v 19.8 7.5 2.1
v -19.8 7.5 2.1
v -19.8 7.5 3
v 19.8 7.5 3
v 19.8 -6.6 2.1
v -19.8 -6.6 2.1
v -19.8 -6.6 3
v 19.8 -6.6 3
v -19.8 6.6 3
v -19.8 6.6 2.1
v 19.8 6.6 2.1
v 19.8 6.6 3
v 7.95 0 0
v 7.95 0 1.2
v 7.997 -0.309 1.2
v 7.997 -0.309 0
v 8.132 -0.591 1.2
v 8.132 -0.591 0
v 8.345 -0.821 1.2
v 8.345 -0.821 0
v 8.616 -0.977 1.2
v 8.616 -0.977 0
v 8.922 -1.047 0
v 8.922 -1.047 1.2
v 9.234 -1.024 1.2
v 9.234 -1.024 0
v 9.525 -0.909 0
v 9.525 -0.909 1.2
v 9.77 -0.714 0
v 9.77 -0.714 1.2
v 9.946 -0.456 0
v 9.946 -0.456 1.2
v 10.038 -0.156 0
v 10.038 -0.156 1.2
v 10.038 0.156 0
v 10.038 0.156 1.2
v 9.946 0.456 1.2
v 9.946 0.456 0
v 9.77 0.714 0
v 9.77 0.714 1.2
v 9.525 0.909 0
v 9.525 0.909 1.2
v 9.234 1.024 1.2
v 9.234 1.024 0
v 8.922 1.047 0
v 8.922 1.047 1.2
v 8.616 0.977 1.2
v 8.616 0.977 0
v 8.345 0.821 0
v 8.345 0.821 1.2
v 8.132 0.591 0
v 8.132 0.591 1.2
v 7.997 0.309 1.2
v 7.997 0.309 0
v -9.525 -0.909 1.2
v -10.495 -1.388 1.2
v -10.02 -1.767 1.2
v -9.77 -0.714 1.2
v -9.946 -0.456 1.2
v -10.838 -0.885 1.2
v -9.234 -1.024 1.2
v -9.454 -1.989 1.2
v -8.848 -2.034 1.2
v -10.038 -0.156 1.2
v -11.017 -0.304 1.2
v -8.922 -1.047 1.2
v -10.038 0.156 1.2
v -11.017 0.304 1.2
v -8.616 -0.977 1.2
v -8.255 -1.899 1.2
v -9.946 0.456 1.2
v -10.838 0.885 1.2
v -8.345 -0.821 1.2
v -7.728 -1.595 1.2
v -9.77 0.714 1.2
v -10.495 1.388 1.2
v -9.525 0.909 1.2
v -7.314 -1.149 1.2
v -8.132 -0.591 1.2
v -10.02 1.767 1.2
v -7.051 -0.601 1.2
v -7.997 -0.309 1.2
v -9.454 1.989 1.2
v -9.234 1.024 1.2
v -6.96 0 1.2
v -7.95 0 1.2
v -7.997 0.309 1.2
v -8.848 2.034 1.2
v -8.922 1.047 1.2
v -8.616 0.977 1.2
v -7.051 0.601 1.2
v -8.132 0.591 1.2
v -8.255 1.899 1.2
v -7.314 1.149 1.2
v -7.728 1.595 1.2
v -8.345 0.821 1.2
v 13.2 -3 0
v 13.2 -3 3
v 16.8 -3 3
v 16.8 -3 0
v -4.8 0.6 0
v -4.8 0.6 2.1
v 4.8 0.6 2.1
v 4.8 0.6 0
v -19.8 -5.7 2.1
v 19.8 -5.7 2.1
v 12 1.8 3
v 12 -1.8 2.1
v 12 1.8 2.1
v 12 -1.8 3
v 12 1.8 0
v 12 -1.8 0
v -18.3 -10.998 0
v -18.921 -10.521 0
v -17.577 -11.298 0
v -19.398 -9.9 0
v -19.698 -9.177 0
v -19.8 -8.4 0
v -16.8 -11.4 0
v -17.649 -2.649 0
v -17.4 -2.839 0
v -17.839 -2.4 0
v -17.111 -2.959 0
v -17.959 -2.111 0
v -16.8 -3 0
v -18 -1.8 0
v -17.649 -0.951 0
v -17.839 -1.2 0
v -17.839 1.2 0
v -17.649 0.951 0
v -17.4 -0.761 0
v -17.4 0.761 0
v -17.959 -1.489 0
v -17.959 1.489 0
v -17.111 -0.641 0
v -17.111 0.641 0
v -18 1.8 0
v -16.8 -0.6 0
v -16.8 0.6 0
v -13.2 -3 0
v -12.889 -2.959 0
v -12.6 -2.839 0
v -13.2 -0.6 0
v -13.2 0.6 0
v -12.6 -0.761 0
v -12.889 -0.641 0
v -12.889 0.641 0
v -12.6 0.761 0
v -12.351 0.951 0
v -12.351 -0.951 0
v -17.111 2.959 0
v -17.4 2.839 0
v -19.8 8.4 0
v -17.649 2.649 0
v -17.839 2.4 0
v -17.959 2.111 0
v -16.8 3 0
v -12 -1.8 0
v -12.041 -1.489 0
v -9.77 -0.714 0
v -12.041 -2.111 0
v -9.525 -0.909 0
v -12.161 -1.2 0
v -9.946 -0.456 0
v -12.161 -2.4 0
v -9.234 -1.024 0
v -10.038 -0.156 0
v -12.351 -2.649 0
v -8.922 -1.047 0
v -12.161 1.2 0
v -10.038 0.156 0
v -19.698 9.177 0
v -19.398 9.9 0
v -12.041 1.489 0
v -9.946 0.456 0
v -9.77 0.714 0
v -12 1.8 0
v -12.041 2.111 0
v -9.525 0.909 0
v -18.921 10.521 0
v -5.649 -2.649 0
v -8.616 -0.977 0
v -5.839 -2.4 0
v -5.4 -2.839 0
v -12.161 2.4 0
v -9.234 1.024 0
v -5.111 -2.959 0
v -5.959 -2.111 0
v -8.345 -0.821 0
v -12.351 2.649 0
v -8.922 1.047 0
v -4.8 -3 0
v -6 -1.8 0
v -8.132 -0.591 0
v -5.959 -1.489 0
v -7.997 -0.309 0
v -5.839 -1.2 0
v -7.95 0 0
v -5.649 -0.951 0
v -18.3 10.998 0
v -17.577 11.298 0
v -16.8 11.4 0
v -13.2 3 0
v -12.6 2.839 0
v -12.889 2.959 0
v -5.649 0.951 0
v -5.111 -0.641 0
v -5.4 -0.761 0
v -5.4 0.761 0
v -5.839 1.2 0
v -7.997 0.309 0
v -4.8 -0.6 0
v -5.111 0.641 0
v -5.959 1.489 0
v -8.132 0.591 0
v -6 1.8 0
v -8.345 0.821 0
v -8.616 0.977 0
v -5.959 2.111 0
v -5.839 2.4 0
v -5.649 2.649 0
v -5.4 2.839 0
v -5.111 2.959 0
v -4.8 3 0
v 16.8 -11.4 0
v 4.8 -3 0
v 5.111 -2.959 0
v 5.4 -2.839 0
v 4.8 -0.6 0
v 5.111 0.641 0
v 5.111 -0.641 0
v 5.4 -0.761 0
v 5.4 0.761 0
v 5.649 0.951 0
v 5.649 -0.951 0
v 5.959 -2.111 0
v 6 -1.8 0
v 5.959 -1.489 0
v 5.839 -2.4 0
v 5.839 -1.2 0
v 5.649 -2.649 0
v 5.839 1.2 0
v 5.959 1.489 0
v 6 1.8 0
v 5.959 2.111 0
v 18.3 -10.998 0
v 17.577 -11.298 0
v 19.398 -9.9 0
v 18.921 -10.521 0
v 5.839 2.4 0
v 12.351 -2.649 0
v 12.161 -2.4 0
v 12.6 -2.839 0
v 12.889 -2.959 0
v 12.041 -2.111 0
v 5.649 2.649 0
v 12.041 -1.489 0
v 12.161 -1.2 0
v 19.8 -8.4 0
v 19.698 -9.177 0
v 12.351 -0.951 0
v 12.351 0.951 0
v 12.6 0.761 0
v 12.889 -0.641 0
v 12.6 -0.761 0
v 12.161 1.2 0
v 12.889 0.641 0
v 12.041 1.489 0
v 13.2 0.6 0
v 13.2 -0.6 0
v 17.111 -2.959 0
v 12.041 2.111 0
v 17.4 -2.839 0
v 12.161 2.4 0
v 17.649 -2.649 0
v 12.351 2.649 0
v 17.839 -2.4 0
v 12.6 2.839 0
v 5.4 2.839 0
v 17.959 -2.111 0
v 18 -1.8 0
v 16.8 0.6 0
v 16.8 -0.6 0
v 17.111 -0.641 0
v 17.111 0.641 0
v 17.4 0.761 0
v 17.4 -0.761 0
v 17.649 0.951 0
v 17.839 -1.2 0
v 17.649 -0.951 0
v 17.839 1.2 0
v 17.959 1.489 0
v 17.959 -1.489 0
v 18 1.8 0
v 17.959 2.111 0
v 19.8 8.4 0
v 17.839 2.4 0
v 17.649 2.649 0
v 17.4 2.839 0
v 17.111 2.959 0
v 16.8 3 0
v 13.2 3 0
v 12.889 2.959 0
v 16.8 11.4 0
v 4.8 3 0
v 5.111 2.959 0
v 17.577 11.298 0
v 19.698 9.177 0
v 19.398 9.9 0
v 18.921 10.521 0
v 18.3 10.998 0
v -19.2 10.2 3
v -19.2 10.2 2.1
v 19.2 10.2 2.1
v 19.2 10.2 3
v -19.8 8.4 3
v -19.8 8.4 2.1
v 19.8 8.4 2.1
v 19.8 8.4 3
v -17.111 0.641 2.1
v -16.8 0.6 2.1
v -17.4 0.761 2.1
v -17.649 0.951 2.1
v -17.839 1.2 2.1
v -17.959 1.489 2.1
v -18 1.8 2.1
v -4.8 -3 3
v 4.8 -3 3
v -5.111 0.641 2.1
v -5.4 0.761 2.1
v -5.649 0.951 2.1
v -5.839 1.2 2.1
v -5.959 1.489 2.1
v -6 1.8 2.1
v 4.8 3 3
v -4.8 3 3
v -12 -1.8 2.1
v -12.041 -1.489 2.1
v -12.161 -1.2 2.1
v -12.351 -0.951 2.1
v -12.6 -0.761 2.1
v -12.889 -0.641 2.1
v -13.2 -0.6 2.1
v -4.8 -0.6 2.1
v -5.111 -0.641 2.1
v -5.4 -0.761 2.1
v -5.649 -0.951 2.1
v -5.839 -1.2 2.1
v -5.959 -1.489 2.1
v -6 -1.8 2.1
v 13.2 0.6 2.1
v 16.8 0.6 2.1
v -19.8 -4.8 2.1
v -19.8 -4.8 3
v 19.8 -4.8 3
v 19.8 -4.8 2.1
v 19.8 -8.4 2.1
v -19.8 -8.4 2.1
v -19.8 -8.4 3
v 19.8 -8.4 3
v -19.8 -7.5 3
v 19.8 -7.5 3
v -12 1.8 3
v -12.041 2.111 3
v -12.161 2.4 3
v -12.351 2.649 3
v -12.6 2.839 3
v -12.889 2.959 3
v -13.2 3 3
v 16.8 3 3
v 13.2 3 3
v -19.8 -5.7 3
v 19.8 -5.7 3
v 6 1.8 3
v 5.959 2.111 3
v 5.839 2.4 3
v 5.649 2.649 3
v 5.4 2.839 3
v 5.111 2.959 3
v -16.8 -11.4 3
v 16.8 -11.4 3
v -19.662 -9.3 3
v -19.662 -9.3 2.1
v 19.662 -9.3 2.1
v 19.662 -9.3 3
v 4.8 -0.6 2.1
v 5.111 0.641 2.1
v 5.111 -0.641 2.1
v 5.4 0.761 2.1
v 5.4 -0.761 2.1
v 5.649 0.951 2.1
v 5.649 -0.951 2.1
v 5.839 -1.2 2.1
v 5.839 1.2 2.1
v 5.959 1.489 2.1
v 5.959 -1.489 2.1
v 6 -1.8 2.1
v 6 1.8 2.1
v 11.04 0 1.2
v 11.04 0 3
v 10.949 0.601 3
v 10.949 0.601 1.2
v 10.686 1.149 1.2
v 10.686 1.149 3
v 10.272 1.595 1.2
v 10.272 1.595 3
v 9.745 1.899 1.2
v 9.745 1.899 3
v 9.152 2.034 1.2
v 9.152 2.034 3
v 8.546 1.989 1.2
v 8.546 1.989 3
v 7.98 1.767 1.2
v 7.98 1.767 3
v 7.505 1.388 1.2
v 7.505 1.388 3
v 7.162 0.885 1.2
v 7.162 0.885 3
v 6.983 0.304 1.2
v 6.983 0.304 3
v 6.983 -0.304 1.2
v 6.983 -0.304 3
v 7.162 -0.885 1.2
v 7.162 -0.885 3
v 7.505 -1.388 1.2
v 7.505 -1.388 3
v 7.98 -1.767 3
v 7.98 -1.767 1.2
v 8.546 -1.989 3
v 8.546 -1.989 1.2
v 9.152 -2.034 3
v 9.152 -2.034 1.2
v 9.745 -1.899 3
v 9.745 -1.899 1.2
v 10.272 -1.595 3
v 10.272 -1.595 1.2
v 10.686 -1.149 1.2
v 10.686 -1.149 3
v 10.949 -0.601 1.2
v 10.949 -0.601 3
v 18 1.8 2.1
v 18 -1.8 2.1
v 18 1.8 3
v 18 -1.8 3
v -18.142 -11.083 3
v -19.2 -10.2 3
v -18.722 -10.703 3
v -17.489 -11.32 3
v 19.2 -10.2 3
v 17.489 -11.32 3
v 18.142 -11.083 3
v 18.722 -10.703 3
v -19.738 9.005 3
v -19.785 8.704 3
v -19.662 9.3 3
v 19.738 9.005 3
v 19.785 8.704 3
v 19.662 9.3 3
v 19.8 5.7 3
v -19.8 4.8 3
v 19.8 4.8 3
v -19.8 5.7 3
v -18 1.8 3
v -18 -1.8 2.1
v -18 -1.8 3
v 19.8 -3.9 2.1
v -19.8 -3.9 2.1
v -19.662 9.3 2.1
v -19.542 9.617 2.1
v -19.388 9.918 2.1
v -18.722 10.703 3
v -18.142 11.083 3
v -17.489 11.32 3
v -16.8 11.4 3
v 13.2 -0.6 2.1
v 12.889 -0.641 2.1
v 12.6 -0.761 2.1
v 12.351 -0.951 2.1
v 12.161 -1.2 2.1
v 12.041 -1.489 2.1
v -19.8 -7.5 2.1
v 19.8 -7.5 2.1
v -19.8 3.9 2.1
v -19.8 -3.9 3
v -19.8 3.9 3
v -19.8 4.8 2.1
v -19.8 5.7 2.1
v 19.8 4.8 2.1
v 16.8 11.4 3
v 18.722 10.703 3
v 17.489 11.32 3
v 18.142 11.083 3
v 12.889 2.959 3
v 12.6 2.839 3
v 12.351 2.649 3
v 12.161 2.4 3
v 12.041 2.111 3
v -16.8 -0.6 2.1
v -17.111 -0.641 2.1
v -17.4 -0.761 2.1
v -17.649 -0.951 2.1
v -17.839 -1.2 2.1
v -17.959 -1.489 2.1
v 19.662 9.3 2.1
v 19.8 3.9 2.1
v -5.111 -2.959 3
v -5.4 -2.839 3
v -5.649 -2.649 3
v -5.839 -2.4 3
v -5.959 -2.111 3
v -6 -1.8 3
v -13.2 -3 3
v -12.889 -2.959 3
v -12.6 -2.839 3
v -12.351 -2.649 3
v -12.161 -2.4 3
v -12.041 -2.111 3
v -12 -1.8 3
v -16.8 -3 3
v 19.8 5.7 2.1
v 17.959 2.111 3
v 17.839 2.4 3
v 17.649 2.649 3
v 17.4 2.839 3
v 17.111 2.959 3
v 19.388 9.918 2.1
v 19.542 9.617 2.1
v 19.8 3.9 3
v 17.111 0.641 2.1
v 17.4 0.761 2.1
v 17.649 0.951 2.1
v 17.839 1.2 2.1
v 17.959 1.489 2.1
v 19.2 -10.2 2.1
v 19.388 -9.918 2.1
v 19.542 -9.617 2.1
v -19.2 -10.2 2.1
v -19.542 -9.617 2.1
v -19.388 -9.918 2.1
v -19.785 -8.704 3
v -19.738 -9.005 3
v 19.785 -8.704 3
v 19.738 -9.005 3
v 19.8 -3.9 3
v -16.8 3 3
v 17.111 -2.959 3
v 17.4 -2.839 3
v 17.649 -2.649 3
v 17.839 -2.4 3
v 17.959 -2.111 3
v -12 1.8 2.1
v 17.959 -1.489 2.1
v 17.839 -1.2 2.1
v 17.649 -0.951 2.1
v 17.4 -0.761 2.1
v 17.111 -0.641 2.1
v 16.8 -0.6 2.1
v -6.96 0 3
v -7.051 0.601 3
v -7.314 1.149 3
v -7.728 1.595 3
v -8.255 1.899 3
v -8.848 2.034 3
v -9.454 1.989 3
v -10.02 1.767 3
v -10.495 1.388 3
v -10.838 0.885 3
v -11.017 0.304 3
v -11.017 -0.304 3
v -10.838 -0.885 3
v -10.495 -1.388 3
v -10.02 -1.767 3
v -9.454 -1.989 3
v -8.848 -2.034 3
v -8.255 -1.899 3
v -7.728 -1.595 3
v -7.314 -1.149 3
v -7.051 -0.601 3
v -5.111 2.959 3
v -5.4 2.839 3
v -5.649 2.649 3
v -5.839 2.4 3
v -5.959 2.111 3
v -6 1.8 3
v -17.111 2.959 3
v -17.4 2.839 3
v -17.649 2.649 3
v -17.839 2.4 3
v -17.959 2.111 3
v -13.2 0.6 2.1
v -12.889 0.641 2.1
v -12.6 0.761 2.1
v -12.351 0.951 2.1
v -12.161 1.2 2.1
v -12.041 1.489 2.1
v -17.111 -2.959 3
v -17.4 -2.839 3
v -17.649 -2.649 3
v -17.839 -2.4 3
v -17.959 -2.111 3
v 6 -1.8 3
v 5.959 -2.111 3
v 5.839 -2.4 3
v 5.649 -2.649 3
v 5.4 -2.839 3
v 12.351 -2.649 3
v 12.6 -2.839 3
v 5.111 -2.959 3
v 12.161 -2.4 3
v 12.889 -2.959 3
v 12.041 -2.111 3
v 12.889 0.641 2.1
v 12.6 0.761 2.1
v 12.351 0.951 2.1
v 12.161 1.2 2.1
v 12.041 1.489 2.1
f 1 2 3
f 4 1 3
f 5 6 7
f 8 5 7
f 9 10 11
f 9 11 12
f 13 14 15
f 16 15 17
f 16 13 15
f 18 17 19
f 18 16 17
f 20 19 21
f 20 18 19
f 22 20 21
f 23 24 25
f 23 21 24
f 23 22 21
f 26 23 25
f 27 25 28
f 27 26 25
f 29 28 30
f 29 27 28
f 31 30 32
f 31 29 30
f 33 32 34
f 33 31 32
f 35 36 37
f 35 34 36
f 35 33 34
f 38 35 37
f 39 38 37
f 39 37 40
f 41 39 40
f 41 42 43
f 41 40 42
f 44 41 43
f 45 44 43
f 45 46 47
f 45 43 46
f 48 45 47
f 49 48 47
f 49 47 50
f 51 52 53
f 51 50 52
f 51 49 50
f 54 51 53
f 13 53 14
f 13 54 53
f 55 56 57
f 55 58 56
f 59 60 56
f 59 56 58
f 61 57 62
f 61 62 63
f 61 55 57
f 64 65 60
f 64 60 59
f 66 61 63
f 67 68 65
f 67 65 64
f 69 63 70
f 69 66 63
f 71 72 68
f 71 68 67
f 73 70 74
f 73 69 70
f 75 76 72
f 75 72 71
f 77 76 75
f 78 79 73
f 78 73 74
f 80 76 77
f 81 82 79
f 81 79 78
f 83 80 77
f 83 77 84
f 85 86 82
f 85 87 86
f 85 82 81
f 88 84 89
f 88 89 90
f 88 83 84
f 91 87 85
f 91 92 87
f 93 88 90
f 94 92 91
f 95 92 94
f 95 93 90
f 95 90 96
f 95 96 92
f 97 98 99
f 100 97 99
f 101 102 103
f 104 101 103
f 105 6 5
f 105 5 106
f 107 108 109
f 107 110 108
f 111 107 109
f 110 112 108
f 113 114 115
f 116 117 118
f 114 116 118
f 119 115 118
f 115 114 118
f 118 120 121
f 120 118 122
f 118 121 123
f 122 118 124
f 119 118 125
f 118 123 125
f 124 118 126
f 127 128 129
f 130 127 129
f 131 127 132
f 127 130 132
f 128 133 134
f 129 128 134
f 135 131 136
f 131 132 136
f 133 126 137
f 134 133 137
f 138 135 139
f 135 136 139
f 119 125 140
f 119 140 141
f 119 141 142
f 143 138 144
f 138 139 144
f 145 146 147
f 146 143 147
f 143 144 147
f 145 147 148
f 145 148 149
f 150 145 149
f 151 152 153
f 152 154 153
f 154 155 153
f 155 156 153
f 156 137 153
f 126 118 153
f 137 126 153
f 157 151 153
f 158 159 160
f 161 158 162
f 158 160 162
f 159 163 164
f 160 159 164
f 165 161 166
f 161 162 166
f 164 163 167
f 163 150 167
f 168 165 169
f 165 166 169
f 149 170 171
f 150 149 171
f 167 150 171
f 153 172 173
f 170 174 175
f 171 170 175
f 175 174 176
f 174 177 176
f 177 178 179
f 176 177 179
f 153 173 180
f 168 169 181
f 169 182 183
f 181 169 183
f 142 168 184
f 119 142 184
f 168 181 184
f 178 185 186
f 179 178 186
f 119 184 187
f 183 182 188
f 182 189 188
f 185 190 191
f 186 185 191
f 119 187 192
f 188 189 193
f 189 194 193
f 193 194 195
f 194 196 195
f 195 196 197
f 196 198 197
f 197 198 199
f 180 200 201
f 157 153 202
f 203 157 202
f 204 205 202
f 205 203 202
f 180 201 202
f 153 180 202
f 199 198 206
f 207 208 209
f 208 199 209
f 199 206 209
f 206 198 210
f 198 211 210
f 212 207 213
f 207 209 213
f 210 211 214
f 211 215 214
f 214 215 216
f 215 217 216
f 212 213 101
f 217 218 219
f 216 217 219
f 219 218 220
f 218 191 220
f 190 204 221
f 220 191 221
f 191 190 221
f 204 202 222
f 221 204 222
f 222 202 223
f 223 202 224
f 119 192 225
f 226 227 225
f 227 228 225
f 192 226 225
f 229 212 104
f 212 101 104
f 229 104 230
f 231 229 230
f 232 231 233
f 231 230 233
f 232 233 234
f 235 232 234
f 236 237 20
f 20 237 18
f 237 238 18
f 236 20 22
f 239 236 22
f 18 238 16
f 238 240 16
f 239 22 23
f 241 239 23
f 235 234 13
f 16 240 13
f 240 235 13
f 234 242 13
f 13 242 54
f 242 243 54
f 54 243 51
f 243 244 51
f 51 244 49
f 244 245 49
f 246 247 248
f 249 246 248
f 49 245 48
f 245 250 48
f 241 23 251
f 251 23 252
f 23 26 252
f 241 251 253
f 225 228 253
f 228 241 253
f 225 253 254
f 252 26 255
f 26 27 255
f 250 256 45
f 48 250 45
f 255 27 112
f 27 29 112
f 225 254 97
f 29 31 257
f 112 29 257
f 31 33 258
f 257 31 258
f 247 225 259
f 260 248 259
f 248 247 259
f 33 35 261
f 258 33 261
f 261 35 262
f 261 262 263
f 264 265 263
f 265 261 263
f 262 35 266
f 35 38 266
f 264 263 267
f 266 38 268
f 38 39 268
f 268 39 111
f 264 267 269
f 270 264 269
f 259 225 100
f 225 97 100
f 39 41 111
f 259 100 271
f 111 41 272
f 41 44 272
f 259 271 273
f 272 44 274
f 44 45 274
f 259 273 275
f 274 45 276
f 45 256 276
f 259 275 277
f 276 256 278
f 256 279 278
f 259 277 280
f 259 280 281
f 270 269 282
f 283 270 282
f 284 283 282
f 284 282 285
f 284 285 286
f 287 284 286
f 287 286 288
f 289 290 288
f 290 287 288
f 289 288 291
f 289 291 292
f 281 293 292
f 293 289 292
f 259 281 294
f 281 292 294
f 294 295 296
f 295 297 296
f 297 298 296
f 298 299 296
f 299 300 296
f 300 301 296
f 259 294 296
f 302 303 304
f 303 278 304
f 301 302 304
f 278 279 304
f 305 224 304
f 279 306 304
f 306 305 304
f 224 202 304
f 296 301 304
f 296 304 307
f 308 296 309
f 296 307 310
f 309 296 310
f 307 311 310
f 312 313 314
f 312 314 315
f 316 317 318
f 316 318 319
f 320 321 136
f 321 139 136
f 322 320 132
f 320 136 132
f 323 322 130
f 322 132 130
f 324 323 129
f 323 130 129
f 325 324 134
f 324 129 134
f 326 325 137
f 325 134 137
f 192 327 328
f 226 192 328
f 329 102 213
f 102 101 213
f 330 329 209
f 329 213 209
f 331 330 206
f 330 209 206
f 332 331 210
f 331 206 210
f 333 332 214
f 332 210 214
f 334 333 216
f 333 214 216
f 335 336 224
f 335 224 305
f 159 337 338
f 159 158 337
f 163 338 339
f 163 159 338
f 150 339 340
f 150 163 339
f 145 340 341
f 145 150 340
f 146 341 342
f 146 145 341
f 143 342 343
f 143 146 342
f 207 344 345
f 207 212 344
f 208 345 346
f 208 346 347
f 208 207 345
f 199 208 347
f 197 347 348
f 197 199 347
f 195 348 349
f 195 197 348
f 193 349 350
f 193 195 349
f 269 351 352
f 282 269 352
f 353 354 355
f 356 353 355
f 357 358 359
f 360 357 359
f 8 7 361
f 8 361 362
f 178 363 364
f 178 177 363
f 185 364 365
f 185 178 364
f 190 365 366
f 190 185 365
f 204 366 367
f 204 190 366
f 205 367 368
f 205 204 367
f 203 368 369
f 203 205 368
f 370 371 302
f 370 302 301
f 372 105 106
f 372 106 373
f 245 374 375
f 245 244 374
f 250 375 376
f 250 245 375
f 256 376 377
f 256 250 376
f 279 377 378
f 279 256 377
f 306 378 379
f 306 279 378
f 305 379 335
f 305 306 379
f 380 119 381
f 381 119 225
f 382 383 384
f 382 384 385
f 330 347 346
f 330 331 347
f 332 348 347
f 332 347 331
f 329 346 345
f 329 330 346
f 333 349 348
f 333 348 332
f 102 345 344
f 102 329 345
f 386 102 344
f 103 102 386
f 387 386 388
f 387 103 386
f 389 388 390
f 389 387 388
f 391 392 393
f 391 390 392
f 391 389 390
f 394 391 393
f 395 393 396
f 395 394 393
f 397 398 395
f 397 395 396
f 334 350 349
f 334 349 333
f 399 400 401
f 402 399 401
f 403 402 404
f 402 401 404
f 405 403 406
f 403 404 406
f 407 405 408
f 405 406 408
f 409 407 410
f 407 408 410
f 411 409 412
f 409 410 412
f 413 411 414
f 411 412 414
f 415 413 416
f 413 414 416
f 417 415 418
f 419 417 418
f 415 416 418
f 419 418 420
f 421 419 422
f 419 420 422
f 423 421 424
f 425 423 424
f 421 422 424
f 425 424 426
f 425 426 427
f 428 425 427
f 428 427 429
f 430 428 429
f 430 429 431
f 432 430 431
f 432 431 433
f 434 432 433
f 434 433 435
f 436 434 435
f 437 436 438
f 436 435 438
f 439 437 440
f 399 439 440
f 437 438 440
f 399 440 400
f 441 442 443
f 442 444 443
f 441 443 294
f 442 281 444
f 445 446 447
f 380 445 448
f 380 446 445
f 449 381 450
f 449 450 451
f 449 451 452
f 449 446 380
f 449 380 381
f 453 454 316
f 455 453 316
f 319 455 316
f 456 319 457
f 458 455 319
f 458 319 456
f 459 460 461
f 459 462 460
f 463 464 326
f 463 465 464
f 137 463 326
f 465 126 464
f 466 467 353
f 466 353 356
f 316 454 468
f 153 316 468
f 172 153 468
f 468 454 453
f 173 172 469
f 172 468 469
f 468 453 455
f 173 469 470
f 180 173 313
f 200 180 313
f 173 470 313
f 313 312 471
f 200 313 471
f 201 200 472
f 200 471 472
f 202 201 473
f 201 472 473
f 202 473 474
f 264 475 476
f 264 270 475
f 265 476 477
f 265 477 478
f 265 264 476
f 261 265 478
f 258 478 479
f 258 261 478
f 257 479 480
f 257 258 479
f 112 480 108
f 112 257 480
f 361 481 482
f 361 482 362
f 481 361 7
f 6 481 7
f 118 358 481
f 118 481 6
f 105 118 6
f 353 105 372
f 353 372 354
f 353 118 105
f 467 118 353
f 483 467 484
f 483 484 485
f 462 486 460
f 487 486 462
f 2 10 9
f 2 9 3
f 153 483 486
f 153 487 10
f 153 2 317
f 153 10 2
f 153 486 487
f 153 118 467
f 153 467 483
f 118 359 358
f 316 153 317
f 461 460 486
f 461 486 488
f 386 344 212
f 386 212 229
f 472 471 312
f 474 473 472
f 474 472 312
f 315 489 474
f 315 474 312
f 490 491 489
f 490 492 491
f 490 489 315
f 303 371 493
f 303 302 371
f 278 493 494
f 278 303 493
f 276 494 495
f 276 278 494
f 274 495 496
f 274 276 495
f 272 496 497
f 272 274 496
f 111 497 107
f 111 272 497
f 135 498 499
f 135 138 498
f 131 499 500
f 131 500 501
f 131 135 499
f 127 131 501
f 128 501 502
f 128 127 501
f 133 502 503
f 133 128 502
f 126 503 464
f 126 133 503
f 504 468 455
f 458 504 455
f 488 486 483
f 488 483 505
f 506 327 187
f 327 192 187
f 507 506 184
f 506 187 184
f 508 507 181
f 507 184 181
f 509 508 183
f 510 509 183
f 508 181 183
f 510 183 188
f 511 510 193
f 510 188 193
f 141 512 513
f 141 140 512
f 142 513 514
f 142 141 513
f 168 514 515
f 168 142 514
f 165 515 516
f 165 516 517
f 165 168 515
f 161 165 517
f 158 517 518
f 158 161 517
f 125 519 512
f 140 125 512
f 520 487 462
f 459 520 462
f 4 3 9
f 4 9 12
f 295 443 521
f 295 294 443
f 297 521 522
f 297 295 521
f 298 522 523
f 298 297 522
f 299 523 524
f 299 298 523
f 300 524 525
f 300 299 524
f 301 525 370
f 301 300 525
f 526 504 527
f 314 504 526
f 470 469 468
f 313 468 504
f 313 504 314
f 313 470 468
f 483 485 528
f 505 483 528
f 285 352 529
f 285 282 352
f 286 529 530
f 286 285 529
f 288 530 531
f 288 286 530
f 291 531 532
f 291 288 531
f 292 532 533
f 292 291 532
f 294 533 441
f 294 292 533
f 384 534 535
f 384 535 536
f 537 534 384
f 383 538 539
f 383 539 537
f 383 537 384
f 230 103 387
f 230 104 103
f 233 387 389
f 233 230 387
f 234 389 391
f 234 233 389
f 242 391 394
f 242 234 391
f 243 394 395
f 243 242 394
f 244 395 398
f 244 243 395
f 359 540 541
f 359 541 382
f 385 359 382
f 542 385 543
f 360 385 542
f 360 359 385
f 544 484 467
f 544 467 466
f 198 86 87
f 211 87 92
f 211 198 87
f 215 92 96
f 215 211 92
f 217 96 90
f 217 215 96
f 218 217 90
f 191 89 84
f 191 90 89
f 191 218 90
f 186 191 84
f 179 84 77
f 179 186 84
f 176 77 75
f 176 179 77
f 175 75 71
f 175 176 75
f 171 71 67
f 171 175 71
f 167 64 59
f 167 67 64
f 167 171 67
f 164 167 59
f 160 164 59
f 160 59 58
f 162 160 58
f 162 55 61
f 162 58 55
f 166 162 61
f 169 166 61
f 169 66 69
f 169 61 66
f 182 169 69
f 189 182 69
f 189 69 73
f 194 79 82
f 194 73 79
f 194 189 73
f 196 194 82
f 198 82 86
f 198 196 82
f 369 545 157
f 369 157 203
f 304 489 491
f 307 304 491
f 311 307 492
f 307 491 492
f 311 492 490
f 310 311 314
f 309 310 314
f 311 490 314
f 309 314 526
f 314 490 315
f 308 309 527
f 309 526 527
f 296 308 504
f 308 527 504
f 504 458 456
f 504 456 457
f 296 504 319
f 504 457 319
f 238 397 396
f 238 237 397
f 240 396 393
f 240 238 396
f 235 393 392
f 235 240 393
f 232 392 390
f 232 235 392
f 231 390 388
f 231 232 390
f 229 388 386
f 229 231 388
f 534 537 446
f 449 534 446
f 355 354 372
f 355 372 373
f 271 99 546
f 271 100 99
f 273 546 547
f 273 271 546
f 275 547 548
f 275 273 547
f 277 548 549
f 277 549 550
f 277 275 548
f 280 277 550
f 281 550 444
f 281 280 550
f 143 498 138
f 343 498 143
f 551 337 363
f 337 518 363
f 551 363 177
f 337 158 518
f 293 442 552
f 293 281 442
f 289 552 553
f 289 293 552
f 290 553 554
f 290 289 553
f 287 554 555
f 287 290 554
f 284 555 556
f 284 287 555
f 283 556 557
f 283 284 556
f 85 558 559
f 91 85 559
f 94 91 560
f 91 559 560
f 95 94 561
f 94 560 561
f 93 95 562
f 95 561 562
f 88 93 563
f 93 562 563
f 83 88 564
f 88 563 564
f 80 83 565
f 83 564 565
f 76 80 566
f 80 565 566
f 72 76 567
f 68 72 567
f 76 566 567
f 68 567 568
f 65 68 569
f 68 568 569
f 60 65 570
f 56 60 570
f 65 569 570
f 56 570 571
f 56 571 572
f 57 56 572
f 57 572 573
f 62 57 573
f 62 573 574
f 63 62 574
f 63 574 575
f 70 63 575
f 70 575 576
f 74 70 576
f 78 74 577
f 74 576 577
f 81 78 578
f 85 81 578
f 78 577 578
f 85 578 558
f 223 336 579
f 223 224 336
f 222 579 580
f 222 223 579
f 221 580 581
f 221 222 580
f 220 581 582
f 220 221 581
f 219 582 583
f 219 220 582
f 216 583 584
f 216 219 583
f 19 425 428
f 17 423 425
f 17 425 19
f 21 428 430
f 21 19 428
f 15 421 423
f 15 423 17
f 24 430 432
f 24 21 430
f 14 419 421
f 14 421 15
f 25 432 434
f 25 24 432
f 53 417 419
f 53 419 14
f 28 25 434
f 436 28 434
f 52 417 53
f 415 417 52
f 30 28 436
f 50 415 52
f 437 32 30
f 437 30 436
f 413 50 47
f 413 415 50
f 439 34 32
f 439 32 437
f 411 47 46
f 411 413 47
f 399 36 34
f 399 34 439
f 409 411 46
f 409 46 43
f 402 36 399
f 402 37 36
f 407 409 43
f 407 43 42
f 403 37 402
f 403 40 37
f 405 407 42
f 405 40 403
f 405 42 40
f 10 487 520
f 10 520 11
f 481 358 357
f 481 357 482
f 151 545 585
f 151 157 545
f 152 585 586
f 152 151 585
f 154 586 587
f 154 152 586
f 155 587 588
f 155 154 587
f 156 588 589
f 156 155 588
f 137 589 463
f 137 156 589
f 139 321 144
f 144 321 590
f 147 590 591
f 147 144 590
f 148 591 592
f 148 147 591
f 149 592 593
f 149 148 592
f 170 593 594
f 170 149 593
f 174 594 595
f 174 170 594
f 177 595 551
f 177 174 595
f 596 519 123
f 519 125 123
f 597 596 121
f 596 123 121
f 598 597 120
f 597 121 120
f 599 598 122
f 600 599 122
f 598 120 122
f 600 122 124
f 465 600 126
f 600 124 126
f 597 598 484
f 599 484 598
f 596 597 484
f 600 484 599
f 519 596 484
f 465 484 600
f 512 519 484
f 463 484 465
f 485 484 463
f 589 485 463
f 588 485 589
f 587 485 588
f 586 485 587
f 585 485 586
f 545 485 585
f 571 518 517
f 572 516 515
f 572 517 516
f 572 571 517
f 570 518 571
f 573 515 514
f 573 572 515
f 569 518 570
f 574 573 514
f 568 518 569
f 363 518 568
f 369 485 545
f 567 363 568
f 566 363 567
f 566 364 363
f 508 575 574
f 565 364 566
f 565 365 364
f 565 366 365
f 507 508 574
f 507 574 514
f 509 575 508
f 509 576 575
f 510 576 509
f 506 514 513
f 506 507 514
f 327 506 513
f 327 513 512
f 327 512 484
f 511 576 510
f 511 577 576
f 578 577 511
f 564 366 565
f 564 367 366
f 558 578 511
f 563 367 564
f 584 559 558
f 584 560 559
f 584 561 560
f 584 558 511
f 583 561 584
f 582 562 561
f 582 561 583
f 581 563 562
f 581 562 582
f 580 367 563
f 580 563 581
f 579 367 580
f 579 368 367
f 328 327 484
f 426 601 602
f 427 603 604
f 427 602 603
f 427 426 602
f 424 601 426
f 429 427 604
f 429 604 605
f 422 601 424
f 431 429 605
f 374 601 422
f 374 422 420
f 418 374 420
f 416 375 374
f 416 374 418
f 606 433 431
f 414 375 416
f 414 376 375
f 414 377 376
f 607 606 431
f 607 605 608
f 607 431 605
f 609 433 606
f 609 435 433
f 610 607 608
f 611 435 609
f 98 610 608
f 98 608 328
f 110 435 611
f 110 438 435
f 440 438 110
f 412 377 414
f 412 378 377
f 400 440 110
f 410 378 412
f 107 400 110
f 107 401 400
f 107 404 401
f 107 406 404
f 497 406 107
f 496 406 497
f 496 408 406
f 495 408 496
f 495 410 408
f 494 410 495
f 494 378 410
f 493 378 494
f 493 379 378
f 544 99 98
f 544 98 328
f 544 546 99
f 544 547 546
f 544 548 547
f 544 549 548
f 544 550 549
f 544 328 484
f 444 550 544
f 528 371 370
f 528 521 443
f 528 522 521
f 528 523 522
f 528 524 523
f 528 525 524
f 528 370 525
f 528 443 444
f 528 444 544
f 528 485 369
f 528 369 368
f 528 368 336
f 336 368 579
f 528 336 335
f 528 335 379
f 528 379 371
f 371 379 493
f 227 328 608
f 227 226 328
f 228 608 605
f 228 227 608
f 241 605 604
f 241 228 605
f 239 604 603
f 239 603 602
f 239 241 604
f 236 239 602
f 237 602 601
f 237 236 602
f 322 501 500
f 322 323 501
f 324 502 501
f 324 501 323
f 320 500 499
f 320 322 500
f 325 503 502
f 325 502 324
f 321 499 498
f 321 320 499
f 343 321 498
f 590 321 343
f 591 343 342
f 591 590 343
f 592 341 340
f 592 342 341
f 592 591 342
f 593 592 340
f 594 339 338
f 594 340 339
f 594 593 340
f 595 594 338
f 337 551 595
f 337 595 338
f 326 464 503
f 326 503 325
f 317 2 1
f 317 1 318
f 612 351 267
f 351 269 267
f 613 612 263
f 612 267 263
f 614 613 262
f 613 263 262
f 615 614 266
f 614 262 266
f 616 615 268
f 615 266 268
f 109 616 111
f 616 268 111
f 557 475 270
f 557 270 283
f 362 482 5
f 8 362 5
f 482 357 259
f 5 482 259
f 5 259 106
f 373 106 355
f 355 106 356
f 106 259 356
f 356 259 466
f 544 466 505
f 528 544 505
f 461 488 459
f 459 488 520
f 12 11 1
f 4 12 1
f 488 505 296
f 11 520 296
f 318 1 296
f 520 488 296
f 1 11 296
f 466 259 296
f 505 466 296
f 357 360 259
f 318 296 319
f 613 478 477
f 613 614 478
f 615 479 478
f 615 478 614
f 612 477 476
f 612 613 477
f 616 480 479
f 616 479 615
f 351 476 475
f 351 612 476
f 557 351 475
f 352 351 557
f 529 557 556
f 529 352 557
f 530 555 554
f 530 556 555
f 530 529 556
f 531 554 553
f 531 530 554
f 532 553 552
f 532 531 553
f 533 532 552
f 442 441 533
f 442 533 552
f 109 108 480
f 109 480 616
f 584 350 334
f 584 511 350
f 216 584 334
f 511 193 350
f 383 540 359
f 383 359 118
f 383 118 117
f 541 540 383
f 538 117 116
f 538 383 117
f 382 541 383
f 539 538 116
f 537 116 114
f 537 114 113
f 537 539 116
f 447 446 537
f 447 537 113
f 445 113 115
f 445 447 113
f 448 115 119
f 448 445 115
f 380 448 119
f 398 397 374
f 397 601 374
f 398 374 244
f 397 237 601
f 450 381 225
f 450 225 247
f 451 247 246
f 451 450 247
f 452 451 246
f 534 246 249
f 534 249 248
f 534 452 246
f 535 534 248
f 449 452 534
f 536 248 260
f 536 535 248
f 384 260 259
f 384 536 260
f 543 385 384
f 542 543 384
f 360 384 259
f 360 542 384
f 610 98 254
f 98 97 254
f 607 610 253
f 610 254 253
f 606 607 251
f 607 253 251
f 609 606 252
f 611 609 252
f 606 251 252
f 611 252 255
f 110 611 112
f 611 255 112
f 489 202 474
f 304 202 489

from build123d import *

# Parameters (mm, degrees)
SKETCH_1_W          = 66
SKETCH_1_H          = 38
SKETCH_1_R          = 1.75
EXTRUDE_1_DEPTH     = 5
SKETCH_2_R          = 3.4
CUT_EXTRUDE_1_DEPTH = 3
SKETCH_3_W          = 1.5
SKETCH_3_H          = 1.5
CUT_EXTRUDE_2_DEPTH = 73
SKETCH_4_W          = 10
SKETCH_4_H          = 1.5
SKETCH_4_W_2        = 20
CUT_EXTRUDE_3_DEPTH = 1.5
FILLET_1_R          = 5
SKETCH_5_W          = 13
SKETCH_5_H          = 1.5
CUT_EXTRUDE_4_DEPTH = 1.5
SKETCH_6_W          = 20
SKETCH_6_H          = 10
SKETCH_6_W_2        = 10
CUT_EXTRUDE_5_DEPTH = 11.5
FILLET_2_R          = 2
SKETCH_7_W          = 10
SKETCH_7_H          = 2
SKETCH_7_W_2        = 20
EXTRUDE_2_DEPTH     = 5
SKETCH_8_W          = 10
SKETCH_8_H          = 2
SKETCH_8_W_2        = 20
CUT_EXTRUDE_6_DEPTH = 1.5
FILLET_3_R          = 2
SCALE_1_SCALE       = 0.6


with BuildPart() as part:
    # 草图1 → 凸台-拉伸1 (new body)
    with BuildSketch(Plane.XY):
        Rectangle(SKETCH_1_W, SKETCH_1_H)
        with Locations((-15, 0)):
            Circle(SKETCH_1_R, mode=Mode.SUBTRACT)
        with Locations(Location((15, 0, 0), (0, 0, 180))):
            Circle(SKETCH_1_R, mode=Mode.SUBTRACT)
    extrude(amount=EXTRUDE_1_DEPTH)

    # 草图2 → 切除-拉伸1 (cut)
    with BuildSketch(Plane.XY.offset(5)):
        with Locations((-15, 0)):
            Circle(SKETCH_2_R)
        with Locations((15, 0)):
            Circle(SKETCH_2_R)
    extrude(amount=-CUT_EXTRUDE_1_DEPTH, mode=Mode.SUBTRACT)

    # 草图3 → 切除-拉伸2 (cut)
    with BuildSketch(Plane.ZY.offset(33)):
        with Locations((4.25, 16.25)):
            Rectangle(SKETCH_3_W, SKETCH_3_H)
        with Locations((4.25, 13.25)):
            Rectangle(SKETCH_3_W, SKETCH_3_H)
        with Locations((4.25, 10.25)):
            Rectangle(SKETCH_3_W, SKETCH_3_H)
        with Locations((4.25, -10.25)):
            Rectangle(SKETCH_3_W, SKETCH_3_H)
        with Locations((4.25, -13.25)):
            Rectangle(SKETCH_3_W, SKETCH_3_H)
        with Locations((4.25, -16.25)):
            Rectangle(SKETCH_3_W, SKETCH_3_H)
    extrude(amount=-CUT_EXTRUDE_2_DEPTH, mode=Mode.SUBTRACT)

    # 草图4 → 切除-拉伸3 (cut)
    with BuildSketch(Plane.XY.offset(5)):
        with Locations((-28, 7.25)):
            Rectangle(SKETCH_4_W, SKETCH_4_H)
        with Locations((-28, -7.25)):
            Rectangle(SKETCH_4_W, SKETCH_4_H)
        with Locations((0, 7.25)):
            Rectangle(SKETCH_4_W_2, SKETCH_4_H)
        with Locations((0, -7.25)):
            Rectangle(SKETCH_4_W_2, SKETCH_4_H)
        with Locations((28, -7.25)):
            Rectangle(SKETCH_4_W, SKETCH_4_H)
        with Locations((28, 7.25)):
            Rectangle(SKETCH_4_W, SKETCH_4_H)
    extrude(amount=-CUT_EXTRUDE_3_DEPTH, mode=Mode.SUBTRACT)

    # 圆角1
    fillet_1_edges = [part.edges().sort_by_distance(p)[0] for p in [
        (33, -19, 2.5),
        (-33, -19, 2.5),
        (33, 19, 2.5),
        (-33, 19, 2.5),
    ]]
    fillet(fillet_1_edges, radius=FILLET_1_R - 0.0001)  # a hair under: the kernel refuses the full size

    # 草图5 → 切除-拉伸4 (cut)
    with BuildSketch(Plane.XY.offset(5)):
        with Locations((-16.5, 7.25)):
            Rectangle(SKETCH_5_W, SKETCH_5_H)
        with Locations((16.5, 7.25)):
            Rectangle(SKETCH_5_W, SKETCH_5_H)
        with Locations((-16.5, -7.25)):
            Rectangle(SKETCH_5_W, SKETCH_5_H)
        with Locations((16.5, -7.25)):
            Rectangle(SKETCH_5_W, SKETCH_5_H)
    extrude(amount=-CUT_EXTRUDE_4_DEPTH, mode=Mode.SUBTRACT)

    # 草图6 → 切除-拉伸5 (cut)
    with BuildSketch(Plane.XY.offset(5)):
        Rectangle(SKETCH_6_W, SKETCH_6_H)
        with Locations((25, 0)):
            Rectangle(SKETCH_6_W_2, SKETCH_6_H)
        with Locations((-25, 0)):
            Rectangle(SKETCH_6_W_2, SKETCH_6_H)
    extrude(amount=-CUT_EXTRUDE_5_DEPTH, mode=Mode.SUBTRACT)

    # 圆角2
    fillet_2_edges = [part.edges().sort_by_distance(p)[0] for p in [
        (-30, 5, 2.5),
        (-20, 5, 2.5),
        (-20, -5, 2.5),
        (-30, -5, 2.5),
        (20, -5, 2.5),
        (20, 5, 2.5),
        (30, 5, 2.5),
        (30, -5, 2.5),
        (-10, -5, 2.5),
        (-10, 5, 2.5),
        (10, 5, 2.5),
        (10, -5, 2.5),
    ]]
    fillet(fillet_2_edges, radius=FILLET_2_R)

    # 草图7 → 凸台-拉伸2 (add)
    with BuildSketch(Plane.XY.offset(5)):
        with Locations((-25, 0)):
            Rectangle(SKETCH_7_W, SKETCH_7_H)
        Rectangle(SKETCH_7_W_2, SKETCH_7_H)
        with Locations((25, 0)):
            Rectangle(SKETCH_7_W, SKETCH_7_H)
    extrude(amount=-EXTRUDE_2_DEPTH)

    # 草图8 → 切除-拉伸6 (cut)
    with BuildSketch(Plane.XY.offset(5)):
        with Locations((-25, 0)):
            Rectangle(SKETCH_8_W, SKETCH_8_H)
        Rectangle(SKETCH_8_W_2, SKETCH_8_H)
        with Locations((25, 0)):
            Rectangle(SKETCH_8_W, SKETCH_8_H)
    extrude(amount=-CUT_EXTRUDE_6_DEPTH, mode=Mode.SUBTRACT)

    # 圆角3
    fillet_3_edges = [part.edges().sort_by_distance(p)[0] for p in [
        (30, -1, 1.75),
        (30, 1, 1.75),
        (20, -1, 1.75),
        (20, 1, 1.75),
        (10, -1, 1.75),
        (10, 1, 1.75),
        (-10, -1, 1.75),
        (-10, 1, 1.75),
        (-30, -1, 1.75),
        (-20, -1, 1.75),
        (-20, 1, 1.75),
        (-30, 1, 1.75),
    ]]
    fillet(fillet_3_edges, radius=FILLET_3_R - 0.0001)  # a hair under: the kernel refuses the full size


with BuildPart() as part_1:
    # 缩放比例1: scaled about (0, 0, 0)
    add(part.part.scale(SCALE_1_SCALE))


solid = part_1.part
